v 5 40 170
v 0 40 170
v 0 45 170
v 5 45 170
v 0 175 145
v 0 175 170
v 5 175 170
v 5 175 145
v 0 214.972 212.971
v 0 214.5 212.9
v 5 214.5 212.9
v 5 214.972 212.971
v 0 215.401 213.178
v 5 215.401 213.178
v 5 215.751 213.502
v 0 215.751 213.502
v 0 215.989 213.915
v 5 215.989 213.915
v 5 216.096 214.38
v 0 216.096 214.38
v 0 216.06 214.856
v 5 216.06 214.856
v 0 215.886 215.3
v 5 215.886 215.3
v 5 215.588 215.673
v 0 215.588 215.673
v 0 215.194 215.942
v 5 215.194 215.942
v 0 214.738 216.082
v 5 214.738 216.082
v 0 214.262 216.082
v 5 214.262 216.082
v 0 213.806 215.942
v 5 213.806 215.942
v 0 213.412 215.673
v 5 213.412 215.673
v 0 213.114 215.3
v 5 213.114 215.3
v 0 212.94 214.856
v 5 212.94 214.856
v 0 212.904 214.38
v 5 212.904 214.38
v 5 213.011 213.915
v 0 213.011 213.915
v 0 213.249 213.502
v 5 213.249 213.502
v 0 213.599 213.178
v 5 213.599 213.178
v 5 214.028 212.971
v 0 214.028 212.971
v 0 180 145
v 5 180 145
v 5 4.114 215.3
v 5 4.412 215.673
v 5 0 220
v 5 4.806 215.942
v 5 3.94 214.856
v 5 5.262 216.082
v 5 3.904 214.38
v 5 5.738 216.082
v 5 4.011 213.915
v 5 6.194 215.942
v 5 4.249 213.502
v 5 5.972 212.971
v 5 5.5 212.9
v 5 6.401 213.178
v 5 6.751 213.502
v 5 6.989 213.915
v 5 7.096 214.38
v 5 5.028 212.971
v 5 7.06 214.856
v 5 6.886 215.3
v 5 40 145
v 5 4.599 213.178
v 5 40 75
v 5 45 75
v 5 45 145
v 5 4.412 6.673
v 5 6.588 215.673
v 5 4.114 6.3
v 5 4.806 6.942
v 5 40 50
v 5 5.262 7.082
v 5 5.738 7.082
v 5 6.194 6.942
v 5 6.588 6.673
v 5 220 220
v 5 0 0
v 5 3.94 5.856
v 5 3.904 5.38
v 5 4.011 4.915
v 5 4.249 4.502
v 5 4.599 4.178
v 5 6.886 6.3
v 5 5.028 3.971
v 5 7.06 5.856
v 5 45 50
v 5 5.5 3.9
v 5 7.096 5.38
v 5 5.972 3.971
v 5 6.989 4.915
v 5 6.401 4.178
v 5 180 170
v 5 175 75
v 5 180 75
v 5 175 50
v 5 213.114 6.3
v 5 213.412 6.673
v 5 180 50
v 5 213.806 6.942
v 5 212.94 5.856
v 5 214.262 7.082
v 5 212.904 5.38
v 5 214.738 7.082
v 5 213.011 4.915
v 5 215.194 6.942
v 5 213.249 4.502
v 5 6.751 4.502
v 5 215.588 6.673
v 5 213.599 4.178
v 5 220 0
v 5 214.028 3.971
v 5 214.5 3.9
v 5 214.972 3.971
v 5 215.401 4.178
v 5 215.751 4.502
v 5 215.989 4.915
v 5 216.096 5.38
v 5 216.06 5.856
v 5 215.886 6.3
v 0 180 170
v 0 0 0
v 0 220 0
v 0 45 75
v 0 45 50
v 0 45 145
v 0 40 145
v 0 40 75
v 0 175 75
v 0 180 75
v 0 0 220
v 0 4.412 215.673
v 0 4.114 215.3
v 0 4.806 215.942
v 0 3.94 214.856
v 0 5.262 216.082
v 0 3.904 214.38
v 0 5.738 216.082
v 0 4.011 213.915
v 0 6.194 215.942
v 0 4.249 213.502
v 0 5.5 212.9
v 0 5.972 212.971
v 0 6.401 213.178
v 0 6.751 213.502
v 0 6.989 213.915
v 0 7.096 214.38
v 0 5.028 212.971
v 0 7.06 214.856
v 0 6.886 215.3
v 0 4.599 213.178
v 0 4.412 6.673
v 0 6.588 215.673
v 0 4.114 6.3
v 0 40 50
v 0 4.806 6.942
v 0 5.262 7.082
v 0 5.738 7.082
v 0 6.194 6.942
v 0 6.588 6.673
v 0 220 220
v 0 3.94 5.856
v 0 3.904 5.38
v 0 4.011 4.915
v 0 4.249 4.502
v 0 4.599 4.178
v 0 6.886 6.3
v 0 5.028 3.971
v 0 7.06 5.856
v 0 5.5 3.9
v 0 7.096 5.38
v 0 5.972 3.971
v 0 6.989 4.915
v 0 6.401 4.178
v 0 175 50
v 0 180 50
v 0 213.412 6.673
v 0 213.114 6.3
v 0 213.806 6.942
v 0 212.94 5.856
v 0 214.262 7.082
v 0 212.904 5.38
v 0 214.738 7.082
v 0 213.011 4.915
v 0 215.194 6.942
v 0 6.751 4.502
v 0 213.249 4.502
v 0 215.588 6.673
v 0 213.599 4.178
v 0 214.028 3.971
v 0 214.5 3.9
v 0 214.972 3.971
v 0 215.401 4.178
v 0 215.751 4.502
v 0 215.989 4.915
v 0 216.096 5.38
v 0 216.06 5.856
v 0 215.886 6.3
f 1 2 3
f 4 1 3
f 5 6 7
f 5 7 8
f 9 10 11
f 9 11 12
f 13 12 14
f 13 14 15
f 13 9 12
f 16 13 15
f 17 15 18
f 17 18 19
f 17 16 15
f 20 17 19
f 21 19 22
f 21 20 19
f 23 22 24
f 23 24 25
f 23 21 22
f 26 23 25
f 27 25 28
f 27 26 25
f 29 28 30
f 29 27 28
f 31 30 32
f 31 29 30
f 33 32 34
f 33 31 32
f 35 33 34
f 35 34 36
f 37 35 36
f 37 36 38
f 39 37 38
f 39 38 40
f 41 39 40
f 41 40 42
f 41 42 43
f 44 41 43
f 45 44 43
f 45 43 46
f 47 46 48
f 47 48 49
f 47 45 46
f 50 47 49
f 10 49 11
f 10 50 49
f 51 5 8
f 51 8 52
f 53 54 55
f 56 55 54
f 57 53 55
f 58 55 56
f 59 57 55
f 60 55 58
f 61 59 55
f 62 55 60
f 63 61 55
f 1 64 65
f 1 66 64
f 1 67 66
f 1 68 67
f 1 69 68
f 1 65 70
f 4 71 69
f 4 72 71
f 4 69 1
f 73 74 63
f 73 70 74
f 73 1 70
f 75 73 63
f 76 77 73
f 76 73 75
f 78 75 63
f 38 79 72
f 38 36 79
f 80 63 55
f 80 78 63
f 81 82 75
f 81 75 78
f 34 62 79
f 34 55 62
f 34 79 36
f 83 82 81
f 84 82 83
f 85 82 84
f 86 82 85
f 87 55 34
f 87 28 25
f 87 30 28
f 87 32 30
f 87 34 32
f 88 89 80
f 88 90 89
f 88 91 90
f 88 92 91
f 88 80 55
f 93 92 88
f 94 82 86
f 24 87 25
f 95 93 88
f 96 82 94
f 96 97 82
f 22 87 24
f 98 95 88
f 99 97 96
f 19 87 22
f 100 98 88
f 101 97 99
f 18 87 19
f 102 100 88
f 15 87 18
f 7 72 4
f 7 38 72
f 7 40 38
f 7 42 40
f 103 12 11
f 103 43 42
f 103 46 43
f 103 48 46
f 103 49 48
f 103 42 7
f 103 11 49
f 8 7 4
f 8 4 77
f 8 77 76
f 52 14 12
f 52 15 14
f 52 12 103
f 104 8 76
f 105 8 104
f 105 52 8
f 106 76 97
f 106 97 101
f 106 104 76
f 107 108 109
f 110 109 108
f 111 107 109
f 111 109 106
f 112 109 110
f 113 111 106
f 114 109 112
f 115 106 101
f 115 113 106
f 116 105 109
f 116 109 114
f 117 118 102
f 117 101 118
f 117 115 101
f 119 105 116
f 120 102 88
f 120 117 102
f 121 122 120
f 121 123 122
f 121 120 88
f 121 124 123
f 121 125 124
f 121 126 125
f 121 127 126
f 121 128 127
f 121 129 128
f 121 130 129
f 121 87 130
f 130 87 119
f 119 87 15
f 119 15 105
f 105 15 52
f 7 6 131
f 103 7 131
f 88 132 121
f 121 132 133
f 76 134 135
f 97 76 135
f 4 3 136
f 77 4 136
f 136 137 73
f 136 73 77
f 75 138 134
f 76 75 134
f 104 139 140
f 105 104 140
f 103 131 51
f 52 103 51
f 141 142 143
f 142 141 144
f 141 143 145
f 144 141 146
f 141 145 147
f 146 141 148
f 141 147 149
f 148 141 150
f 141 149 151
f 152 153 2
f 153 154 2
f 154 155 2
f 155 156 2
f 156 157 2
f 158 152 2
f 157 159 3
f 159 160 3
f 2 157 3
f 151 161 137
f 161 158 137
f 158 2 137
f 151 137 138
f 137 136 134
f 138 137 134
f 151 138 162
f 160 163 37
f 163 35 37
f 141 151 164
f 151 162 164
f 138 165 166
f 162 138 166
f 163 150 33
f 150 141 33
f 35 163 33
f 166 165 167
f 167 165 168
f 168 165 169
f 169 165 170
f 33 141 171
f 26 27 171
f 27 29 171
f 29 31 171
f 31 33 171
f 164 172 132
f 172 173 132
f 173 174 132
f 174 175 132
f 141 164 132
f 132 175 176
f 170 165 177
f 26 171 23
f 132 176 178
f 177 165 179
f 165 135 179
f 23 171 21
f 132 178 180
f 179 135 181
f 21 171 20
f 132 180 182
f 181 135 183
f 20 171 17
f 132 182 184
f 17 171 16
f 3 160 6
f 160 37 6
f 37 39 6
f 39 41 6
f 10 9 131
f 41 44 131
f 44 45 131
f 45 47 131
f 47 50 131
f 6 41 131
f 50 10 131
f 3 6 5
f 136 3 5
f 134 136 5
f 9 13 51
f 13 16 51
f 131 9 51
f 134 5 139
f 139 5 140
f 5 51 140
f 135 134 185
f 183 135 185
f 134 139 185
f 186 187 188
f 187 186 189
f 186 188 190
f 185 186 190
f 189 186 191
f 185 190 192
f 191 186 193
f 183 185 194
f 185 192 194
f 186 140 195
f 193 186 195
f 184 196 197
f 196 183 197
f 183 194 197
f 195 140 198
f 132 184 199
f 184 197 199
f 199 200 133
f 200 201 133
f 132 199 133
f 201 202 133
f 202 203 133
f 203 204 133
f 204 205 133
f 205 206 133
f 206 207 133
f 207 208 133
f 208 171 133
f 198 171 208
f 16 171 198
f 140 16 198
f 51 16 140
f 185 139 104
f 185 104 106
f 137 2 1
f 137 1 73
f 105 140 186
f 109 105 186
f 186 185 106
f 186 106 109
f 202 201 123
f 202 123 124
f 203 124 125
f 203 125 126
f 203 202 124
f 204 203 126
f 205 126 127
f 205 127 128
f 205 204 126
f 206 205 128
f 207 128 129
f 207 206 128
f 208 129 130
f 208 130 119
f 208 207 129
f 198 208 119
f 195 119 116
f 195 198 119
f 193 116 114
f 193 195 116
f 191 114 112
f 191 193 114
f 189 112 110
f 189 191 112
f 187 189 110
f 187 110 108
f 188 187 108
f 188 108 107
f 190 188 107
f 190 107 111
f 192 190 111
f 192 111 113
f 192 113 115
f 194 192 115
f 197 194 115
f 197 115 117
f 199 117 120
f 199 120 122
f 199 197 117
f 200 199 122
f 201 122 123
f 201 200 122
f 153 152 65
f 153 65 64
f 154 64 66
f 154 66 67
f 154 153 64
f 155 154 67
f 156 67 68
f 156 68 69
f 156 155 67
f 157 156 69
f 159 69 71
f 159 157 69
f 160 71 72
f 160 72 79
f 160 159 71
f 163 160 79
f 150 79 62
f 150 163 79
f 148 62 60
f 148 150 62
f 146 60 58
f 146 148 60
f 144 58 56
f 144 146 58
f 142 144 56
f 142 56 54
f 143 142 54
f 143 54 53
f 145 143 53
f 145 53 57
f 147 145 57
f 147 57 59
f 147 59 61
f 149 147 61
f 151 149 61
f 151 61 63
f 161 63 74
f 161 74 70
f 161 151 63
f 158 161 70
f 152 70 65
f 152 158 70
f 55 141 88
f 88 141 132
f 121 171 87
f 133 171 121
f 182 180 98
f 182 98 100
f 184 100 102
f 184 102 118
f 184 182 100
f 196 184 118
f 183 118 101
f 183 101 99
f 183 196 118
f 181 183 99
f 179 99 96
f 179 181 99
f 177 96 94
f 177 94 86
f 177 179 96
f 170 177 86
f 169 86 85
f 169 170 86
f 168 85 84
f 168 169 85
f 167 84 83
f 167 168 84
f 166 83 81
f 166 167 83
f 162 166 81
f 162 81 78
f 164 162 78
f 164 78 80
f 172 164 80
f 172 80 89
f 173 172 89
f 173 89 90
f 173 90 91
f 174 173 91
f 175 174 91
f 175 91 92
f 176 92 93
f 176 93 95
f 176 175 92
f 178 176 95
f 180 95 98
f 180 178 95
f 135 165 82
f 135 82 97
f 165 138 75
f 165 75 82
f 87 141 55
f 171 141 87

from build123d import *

# Parameters (mm, degrees)
SKETCH_1_W      = 220
SKETCH_1_H      = 220
SKETCH_1_R      = 1.6
SKETCH_1_W_2    = 25
SKETCH_1_H_2    = 5
EXTRUDE_1_DEPTH = 5


with BuildPart() as part:
    # 草图1 → 凸台-拉伸1 (new body)
    with BuildSketch(Plane(origin=(0, 0, 0), x_dir=(0, 0, -1), z_dir=(1, 0, 0))):
        with Locations((-110, 110)):
            Rectangle(SKETCH_1_W, SKETCH_1_H)
        with Locations((-214.5, 214.5)):
            Circle(SKETCH_1_R, mode=Mode.SUBTRACT)
        with Locations((-5.5, 214.5)):
            Circle(SKETCH_1_R, mode=Mode.SUBTRACT)
        with Locations((-214.5, 5.5)):
            Circle(SKETCH_1_R, mode=Mode.SUBTRACT)
        with Locations((-5.5, 5.5)):
            Circle(SKETCH_1_R, mode=Mode.SUBTRACT)
        with Locations((-157.5, 42.5)):
            Rectangle(SKETCH_1_W_2, SKETCH_1_H_2, mode=Mode.SUBTRACT)
        with Locations((-62.5, 42.5)):
            Rectangle(SKETCH_1_W_2, SKETCH_1_H_2, mode=Mode.SUBTRACT)
        with Locations((-157.5, 177.5)):
            Rectangle(SKETCH_1_W_2, SKETCH_1_H_2, mode=Mode.SUBTRACT)
        with Locations((-62.5, 177.5)):
            Rectangle(SKETCH_1_W_2, SKETCH_1_H_2, mode=Mode.SUBTRACT)
    extrude(amount=EXTRUDE_1_DEPTH)


solid = part.part
